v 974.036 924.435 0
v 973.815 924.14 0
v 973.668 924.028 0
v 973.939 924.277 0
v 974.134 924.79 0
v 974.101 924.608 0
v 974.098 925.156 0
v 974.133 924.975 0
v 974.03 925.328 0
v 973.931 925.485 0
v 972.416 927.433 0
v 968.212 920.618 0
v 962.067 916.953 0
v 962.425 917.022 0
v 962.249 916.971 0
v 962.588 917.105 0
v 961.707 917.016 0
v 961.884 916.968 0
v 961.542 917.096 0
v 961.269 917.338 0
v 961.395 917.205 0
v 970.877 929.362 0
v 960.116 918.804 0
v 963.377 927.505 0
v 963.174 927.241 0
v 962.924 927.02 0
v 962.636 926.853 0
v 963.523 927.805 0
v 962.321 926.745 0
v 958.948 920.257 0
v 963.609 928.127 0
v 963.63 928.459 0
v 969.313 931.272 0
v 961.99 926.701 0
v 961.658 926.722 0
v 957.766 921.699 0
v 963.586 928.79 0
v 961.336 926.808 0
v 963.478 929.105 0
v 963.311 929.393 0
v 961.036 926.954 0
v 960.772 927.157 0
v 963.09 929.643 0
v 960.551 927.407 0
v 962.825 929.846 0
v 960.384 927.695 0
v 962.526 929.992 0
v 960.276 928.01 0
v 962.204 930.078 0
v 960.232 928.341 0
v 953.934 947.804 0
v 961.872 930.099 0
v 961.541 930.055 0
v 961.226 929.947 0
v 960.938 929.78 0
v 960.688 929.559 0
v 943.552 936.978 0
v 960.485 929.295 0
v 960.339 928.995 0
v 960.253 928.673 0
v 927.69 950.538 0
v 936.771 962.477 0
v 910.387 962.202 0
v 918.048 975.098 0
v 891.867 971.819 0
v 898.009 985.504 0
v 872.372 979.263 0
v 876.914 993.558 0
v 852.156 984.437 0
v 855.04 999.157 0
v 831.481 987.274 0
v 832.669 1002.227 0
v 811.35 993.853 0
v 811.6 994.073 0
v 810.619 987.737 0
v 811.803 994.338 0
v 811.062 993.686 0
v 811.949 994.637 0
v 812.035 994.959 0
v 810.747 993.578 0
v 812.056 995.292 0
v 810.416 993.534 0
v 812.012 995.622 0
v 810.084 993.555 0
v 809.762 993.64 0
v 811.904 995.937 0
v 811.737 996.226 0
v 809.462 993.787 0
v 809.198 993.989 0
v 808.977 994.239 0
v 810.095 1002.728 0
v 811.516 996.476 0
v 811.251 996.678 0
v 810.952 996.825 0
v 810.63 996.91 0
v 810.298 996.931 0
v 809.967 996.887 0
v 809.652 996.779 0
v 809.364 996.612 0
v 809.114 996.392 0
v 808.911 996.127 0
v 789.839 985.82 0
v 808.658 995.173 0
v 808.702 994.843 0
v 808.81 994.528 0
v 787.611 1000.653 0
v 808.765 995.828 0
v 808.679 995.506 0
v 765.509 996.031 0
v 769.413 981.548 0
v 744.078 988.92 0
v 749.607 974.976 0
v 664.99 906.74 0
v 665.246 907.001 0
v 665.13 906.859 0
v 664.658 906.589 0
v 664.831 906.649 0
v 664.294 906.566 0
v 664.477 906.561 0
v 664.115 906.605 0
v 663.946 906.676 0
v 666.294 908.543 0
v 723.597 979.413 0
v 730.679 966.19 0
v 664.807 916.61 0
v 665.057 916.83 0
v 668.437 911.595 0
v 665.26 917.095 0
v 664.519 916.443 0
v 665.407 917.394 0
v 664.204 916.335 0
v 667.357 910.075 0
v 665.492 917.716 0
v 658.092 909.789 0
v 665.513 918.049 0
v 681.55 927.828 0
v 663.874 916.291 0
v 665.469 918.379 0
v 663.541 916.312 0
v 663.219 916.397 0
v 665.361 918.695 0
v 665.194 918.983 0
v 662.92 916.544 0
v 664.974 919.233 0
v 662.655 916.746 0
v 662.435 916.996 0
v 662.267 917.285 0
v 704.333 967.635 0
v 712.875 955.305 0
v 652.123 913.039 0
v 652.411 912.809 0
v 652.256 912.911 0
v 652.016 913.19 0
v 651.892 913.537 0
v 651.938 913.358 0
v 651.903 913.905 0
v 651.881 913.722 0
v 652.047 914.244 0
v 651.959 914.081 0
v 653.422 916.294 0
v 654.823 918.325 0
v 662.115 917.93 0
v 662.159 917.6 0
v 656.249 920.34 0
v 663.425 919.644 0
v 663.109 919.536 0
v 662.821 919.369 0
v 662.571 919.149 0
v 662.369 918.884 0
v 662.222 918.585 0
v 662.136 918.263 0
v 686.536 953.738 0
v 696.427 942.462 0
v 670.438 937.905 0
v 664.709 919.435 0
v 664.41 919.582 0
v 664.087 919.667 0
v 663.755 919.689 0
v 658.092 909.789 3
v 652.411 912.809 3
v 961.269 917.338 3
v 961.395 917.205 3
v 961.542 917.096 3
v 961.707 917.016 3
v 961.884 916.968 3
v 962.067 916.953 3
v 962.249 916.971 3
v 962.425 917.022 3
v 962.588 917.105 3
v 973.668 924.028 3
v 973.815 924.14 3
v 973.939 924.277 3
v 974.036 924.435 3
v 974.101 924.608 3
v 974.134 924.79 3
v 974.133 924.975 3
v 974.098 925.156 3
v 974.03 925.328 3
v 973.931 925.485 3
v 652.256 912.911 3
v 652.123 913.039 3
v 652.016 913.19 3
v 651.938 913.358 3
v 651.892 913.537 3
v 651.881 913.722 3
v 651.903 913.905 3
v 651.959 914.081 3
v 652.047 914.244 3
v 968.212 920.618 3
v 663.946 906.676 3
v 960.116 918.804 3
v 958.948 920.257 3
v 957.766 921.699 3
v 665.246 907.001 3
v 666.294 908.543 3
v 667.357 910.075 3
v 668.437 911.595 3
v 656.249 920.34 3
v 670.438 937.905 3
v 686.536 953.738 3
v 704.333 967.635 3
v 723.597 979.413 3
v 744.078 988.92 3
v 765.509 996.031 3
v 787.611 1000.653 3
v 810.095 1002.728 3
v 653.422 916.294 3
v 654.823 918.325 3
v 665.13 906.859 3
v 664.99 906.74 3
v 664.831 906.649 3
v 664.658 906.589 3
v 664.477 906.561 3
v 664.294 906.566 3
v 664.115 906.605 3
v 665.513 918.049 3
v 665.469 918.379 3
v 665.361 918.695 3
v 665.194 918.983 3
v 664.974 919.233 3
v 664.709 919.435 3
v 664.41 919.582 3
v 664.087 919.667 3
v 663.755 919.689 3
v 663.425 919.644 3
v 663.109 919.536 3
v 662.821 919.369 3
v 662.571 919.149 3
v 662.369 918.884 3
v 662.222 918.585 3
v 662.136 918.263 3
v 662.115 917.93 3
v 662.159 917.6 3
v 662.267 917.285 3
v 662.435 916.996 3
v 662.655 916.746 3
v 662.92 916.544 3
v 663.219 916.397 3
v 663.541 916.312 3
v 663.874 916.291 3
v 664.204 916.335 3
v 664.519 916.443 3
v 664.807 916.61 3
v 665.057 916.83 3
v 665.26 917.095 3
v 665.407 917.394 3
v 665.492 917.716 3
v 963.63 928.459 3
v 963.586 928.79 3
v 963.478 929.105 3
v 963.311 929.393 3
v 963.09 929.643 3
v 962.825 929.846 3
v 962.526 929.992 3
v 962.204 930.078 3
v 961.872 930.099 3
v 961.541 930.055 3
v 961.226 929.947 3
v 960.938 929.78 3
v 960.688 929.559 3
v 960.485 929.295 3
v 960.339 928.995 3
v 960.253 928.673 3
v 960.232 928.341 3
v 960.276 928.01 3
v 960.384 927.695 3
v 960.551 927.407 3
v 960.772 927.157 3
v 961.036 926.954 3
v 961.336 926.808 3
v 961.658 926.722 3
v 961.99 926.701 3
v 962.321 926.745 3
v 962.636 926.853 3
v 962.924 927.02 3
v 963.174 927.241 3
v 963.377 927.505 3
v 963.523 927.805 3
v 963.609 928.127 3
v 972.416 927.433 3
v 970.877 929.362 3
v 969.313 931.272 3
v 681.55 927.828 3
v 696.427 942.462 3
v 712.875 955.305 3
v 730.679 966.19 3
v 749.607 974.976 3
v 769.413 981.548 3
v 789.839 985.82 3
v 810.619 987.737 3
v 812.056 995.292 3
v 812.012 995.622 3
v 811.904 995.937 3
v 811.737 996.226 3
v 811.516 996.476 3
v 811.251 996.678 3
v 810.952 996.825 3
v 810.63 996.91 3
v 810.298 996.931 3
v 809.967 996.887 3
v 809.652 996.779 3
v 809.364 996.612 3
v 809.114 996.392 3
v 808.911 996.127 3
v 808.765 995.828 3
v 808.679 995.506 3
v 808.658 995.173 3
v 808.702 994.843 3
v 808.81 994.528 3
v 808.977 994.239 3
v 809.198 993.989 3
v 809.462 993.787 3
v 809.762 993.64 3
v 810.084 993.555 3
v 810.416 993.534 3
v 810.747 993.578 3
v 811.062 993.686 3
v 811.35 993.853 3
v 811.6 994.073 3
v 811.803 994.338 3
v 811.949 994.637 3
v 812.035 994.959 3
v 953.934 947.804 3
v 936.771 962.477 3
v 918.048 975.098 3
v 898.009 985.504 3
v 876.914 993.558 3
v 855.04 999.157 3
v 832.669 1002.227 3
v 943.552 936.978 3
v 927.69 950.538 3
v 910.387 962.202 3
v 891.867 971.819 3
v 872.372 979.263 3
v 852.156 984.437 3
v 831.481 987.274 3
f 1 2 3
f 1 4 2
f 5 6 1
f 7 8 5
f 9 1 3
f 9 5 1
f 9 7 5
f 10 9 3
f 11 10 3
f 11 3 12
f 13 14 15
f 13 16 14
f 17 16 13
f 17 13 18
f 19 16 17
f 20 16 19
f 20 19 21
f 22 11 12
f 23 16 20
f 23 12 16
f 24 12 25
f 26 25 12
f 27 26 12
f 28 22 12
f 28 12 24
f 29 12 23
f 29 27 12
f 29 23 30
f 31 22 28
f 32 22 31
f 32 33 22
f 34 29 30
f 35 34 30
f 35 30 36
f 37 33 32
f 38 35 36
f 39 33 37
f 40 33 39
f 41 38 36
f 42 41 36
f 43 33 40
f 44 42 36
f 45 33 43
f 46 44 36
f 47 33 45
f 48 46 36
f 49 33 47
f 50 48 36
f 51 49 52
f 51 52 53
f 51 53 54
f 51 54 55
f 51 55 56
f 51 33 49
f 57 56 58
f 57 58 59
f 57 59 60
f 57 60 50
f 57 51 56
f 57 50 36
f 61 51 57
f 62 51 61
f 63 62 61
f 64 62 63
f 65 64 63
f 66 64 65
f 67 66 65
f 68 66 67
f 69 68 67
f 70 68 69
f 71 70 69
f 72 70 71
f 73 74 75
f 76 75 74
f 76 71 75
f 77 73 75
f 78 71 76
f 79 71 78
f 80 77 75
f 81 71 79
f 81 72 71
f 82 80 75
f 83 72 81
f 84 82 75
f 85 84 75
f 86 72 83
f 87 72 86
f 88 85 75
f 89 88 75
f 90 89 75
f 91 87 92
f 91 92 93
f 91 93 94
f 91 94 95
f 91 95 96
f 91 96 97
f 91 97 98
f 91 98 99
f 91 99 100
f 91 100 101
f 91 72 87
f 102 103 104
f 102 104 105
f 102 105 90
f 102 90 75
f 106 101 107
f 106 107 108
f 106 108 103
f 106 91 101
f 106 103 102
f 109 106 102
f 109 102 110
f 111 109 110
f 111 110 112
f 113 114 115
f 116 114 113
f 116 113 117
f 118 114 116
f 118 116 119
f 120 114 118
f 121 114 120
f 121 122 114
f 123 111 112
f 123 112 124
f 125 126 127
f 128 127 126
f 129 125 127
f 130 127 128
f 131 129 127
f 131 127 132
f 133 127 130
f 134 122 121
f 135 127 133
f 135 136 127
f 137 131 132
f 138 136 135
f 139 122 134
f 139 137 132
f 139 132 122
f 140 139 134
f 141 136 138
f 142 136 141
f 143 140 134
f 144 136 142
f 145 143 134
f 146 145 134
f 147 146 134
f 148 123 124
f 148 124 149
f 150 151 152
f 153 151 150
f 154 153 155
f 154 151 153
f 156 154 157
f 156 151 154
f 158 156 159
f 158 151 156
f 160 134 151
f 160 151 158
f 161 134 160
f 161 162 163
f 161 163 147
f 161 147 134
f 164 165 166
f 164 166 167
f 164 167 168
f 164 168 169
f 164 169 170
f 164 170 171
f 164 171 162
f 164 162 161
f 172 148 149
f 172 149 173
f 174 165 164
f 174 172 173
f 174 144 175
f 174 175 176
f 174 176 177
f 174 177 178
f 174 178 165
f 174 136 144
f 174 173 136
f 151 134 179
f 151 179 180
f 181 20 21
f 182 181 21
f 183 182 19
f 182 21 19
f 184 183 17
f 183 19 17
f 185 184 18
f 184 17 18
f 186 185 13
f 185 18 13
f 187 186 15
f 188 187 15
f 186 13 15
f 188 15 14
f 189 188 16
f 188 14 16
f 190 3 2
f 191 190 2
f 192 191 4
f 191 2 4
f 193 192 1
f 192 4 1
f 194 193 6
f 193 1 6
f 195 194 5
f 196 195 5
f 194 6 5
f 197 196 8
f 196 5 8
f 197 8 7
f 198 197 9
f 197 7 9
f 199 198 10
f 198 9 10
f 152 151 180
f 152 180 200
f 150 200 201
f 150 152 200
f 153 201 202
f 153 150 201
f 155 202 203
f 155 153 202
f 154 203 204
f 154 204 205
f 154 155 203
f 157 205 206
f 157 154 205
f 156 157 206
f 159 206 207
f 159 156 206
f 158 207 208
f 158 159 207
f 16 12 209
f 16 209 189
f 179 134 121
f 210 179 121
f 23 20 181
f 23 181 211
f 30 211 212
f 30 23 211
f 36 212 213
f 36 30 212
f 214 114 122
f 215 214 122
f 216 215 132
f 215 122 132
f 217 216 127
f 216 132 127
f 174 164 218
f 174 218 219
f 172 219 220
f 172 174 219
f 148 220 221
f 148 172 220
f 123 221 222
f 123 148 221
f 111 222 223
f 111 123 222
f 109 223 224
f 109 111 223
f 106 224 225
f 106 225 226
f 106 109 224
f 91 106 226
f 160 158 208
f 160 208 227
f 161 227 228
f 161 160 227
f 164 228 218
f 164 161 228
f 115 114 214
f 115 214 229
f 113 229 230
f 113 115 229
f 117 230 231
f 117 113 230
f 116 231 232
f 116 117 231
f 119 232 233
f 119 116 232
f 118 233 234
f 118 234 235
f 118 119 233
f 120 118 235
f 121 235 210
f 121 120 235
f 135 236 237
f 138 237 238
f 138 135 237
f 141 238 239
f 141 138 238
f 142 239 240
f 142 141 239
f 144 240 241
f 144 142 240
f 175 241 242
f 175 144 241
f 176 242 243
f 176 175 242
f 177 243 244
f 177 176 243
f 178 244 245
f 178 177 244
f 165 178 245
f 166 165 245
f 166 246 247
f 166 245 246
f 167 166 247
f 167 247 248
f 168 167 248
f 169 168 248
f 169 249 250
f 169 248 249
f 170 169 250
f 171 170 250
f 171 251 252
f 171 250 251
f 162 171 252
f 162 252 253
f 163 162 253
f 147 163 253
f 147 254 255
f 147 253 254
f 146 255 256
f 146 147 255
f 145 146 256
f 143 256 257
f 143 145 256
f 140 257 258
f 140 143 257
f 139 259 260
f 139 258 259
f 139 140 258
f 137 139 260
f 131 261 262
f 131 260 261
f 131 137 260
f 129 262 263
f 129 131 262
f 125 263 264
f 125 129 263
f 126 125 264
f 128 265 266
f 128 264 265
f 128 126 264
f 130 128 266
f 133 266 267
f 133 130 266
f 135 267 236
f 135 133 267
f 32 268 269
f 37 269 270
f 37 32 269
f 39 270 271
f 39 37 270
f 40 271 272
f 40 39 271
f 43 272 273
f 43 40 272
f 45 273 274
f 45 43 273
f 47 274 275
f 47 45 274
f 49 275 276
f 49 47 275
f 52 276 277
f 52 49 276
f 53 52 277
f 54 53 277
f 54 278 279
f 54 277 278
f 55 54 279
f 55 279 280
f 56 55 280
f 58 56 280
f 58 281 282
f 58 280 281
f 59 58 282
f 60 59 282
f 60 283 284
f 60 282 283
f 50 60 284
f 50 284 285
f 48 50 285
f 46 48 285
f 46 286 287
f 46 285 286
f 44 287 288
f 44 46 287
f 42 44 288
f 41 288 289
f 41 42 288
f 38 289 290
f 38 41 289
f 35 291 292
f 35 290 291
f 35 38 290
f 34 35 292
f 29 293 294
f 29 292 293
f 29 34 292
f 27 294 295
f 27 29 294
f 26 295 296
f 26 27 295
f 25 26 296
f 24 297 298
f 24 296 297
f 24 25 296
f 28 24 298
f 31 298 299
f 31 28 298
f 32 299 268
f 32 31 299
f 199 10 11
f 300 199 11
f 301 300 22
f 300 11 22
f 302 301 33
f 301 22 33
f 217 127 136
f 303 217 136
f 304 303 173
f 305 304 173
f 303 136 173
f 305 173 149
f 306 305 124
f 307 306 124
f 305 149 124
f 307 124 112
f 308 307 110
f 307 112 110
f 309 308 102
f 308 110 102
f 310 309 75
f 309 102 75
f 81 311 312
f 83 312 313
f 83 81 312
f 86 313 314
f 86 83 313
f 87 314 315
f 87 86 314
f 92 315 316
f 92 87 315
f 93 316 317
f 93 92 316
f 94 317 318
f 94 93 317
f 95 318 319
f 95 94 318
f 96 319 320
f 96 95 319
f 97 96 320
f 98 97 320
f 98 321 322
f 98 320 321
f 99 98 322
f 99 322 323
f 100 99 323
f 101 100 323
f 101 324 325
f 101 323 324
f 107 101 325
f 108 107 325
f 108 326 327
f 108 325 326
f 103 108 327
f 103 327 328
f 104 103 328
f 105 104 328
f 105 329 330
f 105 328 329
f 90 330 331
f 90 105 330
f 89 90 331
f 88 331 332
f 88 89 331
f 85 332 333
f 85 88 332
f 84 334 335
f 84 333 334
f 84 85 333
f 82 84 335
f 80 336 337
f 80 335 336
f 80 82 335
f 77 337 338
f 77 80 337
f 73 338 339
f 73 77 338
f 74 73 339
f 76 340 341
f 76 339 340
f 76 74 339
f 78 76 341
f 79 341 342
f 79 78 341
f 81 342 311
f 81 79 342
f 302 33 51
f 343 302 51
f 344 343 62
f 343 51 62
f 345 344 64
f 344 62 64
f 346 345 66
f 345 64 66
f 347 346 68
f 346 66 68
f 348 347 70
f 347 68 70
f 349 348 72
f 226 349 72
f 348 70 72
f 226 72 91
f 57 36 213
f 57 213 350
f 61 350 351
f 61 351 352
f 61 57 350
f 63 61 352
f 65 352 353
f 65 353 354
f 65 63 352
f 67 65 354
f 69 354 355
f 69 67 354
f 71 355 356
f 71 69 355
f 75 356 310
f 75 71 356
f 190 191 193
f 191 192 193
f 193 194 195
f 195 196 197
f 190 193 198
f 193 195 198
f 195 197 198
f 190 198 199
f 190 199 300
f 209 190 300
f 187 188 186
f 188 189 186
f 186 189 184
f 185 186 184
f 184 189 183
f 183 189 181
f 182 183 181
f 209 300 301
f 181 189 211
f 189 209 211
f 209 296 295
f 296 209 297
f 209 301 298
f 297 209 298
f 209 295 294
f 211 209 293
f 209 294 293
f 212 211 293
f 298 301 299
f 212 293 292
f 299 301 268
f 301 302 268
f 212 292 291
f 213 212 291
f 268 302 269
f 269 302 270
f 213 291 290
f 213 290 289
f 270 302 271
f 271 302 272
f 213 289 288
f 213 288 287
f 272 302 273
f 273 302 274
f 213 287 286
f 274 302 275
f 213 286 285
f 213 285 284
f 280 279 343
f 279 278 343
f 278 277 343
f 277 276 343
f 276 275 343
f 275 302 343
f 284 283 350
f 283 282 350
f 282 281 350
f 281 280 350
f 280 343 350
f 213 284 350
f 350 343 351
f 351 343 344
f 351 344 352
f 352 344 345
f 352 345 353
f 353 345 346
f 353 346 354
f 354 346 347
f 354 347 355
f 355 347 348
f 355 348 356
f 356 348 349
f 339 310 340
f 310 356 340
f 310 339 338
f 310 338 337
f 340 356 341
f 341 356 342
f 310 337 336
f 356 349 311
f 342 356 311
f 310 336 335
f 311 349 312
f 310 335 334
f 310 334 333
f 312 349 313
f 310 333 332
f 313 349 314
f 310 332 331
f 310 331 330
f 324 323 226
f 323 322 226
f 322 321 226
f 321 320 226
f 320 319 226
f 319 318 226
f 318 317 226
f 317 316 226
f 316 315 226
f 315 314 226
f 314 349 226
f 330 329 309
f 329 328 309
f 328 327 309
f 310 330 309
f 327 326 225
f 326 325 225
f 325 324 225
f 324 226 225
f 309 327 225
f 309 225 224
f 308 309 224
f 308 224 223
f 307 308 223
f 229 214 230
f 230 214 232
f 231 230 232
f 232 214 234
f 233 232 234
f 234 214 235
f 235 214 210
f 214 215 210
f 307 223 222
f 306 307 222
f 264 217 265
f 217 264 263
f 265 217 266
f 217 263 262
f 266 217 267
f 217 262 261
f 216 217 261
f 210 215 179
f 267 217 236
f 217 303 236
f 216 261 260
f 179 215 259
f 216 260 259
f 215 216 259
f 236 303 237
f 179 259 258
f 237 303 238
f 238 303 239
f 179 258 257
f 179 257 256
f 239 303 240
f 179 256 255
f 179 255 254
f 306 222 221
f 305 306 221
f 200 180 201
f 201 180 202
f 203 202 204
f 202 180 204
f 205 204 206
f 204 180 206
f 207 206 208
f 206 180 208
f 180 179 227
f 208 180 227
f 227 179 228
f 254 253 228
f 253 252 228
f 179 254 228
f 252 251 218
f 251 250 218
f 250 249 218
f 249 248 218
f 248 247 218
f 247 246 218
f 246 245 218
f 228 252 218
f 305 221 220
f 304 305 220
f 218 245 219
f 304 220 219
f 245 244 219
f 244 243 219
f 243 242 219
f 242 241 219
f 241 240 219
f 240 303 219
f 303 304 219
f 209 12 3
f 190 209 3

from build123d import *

# Parameters (mm, degrees)
PAD021_DEPTH                        = 3
SKETCH083_R                         = 1.7
POCKET041_DEPTH                     = 0.001
POCKET041_DEPTH_BACK                = 3.001
SKETCH084_R                         = 1.7
POCKET042_DEPTH                     = 0.001
POCKET042_DEPTH_BACK                = 3.001
BODY001003005003013_PLACEMENT_ANGLE = 60
CLONE017_PLACEMENT_ANGLE            = 58


with BuildPart() as part:
    # Sketch082 → Pad021 (new body)
    with BuildSketch(Plane.XY):
        with BuildLine():
            ThreePointArc((156.627412, 120.879551), (87.258751, 177.56667), (0, 197.848457))
            Line((0, 197.848457), (0, 182.848457))
            ThreePointArc((144.752611, 111.714995), (80.643177, 164.104346), (0, 182.848457))
            ThreePointArc((148.102078, 107.234942), (146.444477, 109.487778), (144.752611, 111.714995))
            ThreePointArc((148.102078, 107.234942), (148.703343, 106.843433), (149.41205, 106.955386))
            Line((155.154429, 110.27075), (149.41205, 106.955386))
            Line((155.154429, 110.27075), (160.726477, 113.487773))
            ThreePointArc((160.726477, 113.487773), (161.203737, 114.141753), (161.040435, 114.934722))
            ThreePointArc((161.040435, 114.934722), (158.861734, 117.927781), (156.627412, 120.879551))
        make_face()
    pad021 = extrude(amount=PAD021_DEPTH)

    # Mirrored029: Pad021 across Sketch082 V_Axis
    add(pad021.mirror(Plane(origin=(0, 0, 0), x_dir=(0, 0, 1), z_dir=(1, 0, 0))))

    # Sketch083 → Pocket041 (cut, two sides)
    with BuildSketch(Plane.XY) as pocket041_sk:
        with Locations((149.149219, 118.266841)):
            Circle(SKETCH083_R)
        with Locations((-149.149219, 118.266841)):
            Circle(SKETCH083_R)
    extrude(amount=-POCKET041_DEPTH, mode=Mode.SUBTRACT)
    extrude(pocket041_sk.sketch, amount=POCKET041_DEPTH_BACK, mode=Mode.SUBTRACT)

    # Sketch084 → Pocket042 (cut, two sides)
    with BuildSketch(Plane.XY) as pocket042_sk:
        with Locations((0, 190.348457)):
            Circle(SKETCH084_R)
    extrude(amount=-POCKET042_DEPTH, mode=Mode.SUBTRACT)
    extrude(pocket042_sk.sketch, amount=POCKET042_DEPTH_BACK, mode=Mode.SUBTRACT)


with BuildPart() as part_1:
    # Body001003005003013 placement: moved
    add(part.part.rotate(Axis((0, 0, 0), (0, 0, 1)), BODY001003005003013_PLACEMENT_ANGLE))


with BuildPart() as part_2:
    # Clone017 placement: moved
    add(part_1.part.moved(Location((817, 805, 0))).rotate(Axis((817, 805, 0), (0, 0, -1)), CLONE017_PLACEMENT_ANGLE))


solid = part_2.part
